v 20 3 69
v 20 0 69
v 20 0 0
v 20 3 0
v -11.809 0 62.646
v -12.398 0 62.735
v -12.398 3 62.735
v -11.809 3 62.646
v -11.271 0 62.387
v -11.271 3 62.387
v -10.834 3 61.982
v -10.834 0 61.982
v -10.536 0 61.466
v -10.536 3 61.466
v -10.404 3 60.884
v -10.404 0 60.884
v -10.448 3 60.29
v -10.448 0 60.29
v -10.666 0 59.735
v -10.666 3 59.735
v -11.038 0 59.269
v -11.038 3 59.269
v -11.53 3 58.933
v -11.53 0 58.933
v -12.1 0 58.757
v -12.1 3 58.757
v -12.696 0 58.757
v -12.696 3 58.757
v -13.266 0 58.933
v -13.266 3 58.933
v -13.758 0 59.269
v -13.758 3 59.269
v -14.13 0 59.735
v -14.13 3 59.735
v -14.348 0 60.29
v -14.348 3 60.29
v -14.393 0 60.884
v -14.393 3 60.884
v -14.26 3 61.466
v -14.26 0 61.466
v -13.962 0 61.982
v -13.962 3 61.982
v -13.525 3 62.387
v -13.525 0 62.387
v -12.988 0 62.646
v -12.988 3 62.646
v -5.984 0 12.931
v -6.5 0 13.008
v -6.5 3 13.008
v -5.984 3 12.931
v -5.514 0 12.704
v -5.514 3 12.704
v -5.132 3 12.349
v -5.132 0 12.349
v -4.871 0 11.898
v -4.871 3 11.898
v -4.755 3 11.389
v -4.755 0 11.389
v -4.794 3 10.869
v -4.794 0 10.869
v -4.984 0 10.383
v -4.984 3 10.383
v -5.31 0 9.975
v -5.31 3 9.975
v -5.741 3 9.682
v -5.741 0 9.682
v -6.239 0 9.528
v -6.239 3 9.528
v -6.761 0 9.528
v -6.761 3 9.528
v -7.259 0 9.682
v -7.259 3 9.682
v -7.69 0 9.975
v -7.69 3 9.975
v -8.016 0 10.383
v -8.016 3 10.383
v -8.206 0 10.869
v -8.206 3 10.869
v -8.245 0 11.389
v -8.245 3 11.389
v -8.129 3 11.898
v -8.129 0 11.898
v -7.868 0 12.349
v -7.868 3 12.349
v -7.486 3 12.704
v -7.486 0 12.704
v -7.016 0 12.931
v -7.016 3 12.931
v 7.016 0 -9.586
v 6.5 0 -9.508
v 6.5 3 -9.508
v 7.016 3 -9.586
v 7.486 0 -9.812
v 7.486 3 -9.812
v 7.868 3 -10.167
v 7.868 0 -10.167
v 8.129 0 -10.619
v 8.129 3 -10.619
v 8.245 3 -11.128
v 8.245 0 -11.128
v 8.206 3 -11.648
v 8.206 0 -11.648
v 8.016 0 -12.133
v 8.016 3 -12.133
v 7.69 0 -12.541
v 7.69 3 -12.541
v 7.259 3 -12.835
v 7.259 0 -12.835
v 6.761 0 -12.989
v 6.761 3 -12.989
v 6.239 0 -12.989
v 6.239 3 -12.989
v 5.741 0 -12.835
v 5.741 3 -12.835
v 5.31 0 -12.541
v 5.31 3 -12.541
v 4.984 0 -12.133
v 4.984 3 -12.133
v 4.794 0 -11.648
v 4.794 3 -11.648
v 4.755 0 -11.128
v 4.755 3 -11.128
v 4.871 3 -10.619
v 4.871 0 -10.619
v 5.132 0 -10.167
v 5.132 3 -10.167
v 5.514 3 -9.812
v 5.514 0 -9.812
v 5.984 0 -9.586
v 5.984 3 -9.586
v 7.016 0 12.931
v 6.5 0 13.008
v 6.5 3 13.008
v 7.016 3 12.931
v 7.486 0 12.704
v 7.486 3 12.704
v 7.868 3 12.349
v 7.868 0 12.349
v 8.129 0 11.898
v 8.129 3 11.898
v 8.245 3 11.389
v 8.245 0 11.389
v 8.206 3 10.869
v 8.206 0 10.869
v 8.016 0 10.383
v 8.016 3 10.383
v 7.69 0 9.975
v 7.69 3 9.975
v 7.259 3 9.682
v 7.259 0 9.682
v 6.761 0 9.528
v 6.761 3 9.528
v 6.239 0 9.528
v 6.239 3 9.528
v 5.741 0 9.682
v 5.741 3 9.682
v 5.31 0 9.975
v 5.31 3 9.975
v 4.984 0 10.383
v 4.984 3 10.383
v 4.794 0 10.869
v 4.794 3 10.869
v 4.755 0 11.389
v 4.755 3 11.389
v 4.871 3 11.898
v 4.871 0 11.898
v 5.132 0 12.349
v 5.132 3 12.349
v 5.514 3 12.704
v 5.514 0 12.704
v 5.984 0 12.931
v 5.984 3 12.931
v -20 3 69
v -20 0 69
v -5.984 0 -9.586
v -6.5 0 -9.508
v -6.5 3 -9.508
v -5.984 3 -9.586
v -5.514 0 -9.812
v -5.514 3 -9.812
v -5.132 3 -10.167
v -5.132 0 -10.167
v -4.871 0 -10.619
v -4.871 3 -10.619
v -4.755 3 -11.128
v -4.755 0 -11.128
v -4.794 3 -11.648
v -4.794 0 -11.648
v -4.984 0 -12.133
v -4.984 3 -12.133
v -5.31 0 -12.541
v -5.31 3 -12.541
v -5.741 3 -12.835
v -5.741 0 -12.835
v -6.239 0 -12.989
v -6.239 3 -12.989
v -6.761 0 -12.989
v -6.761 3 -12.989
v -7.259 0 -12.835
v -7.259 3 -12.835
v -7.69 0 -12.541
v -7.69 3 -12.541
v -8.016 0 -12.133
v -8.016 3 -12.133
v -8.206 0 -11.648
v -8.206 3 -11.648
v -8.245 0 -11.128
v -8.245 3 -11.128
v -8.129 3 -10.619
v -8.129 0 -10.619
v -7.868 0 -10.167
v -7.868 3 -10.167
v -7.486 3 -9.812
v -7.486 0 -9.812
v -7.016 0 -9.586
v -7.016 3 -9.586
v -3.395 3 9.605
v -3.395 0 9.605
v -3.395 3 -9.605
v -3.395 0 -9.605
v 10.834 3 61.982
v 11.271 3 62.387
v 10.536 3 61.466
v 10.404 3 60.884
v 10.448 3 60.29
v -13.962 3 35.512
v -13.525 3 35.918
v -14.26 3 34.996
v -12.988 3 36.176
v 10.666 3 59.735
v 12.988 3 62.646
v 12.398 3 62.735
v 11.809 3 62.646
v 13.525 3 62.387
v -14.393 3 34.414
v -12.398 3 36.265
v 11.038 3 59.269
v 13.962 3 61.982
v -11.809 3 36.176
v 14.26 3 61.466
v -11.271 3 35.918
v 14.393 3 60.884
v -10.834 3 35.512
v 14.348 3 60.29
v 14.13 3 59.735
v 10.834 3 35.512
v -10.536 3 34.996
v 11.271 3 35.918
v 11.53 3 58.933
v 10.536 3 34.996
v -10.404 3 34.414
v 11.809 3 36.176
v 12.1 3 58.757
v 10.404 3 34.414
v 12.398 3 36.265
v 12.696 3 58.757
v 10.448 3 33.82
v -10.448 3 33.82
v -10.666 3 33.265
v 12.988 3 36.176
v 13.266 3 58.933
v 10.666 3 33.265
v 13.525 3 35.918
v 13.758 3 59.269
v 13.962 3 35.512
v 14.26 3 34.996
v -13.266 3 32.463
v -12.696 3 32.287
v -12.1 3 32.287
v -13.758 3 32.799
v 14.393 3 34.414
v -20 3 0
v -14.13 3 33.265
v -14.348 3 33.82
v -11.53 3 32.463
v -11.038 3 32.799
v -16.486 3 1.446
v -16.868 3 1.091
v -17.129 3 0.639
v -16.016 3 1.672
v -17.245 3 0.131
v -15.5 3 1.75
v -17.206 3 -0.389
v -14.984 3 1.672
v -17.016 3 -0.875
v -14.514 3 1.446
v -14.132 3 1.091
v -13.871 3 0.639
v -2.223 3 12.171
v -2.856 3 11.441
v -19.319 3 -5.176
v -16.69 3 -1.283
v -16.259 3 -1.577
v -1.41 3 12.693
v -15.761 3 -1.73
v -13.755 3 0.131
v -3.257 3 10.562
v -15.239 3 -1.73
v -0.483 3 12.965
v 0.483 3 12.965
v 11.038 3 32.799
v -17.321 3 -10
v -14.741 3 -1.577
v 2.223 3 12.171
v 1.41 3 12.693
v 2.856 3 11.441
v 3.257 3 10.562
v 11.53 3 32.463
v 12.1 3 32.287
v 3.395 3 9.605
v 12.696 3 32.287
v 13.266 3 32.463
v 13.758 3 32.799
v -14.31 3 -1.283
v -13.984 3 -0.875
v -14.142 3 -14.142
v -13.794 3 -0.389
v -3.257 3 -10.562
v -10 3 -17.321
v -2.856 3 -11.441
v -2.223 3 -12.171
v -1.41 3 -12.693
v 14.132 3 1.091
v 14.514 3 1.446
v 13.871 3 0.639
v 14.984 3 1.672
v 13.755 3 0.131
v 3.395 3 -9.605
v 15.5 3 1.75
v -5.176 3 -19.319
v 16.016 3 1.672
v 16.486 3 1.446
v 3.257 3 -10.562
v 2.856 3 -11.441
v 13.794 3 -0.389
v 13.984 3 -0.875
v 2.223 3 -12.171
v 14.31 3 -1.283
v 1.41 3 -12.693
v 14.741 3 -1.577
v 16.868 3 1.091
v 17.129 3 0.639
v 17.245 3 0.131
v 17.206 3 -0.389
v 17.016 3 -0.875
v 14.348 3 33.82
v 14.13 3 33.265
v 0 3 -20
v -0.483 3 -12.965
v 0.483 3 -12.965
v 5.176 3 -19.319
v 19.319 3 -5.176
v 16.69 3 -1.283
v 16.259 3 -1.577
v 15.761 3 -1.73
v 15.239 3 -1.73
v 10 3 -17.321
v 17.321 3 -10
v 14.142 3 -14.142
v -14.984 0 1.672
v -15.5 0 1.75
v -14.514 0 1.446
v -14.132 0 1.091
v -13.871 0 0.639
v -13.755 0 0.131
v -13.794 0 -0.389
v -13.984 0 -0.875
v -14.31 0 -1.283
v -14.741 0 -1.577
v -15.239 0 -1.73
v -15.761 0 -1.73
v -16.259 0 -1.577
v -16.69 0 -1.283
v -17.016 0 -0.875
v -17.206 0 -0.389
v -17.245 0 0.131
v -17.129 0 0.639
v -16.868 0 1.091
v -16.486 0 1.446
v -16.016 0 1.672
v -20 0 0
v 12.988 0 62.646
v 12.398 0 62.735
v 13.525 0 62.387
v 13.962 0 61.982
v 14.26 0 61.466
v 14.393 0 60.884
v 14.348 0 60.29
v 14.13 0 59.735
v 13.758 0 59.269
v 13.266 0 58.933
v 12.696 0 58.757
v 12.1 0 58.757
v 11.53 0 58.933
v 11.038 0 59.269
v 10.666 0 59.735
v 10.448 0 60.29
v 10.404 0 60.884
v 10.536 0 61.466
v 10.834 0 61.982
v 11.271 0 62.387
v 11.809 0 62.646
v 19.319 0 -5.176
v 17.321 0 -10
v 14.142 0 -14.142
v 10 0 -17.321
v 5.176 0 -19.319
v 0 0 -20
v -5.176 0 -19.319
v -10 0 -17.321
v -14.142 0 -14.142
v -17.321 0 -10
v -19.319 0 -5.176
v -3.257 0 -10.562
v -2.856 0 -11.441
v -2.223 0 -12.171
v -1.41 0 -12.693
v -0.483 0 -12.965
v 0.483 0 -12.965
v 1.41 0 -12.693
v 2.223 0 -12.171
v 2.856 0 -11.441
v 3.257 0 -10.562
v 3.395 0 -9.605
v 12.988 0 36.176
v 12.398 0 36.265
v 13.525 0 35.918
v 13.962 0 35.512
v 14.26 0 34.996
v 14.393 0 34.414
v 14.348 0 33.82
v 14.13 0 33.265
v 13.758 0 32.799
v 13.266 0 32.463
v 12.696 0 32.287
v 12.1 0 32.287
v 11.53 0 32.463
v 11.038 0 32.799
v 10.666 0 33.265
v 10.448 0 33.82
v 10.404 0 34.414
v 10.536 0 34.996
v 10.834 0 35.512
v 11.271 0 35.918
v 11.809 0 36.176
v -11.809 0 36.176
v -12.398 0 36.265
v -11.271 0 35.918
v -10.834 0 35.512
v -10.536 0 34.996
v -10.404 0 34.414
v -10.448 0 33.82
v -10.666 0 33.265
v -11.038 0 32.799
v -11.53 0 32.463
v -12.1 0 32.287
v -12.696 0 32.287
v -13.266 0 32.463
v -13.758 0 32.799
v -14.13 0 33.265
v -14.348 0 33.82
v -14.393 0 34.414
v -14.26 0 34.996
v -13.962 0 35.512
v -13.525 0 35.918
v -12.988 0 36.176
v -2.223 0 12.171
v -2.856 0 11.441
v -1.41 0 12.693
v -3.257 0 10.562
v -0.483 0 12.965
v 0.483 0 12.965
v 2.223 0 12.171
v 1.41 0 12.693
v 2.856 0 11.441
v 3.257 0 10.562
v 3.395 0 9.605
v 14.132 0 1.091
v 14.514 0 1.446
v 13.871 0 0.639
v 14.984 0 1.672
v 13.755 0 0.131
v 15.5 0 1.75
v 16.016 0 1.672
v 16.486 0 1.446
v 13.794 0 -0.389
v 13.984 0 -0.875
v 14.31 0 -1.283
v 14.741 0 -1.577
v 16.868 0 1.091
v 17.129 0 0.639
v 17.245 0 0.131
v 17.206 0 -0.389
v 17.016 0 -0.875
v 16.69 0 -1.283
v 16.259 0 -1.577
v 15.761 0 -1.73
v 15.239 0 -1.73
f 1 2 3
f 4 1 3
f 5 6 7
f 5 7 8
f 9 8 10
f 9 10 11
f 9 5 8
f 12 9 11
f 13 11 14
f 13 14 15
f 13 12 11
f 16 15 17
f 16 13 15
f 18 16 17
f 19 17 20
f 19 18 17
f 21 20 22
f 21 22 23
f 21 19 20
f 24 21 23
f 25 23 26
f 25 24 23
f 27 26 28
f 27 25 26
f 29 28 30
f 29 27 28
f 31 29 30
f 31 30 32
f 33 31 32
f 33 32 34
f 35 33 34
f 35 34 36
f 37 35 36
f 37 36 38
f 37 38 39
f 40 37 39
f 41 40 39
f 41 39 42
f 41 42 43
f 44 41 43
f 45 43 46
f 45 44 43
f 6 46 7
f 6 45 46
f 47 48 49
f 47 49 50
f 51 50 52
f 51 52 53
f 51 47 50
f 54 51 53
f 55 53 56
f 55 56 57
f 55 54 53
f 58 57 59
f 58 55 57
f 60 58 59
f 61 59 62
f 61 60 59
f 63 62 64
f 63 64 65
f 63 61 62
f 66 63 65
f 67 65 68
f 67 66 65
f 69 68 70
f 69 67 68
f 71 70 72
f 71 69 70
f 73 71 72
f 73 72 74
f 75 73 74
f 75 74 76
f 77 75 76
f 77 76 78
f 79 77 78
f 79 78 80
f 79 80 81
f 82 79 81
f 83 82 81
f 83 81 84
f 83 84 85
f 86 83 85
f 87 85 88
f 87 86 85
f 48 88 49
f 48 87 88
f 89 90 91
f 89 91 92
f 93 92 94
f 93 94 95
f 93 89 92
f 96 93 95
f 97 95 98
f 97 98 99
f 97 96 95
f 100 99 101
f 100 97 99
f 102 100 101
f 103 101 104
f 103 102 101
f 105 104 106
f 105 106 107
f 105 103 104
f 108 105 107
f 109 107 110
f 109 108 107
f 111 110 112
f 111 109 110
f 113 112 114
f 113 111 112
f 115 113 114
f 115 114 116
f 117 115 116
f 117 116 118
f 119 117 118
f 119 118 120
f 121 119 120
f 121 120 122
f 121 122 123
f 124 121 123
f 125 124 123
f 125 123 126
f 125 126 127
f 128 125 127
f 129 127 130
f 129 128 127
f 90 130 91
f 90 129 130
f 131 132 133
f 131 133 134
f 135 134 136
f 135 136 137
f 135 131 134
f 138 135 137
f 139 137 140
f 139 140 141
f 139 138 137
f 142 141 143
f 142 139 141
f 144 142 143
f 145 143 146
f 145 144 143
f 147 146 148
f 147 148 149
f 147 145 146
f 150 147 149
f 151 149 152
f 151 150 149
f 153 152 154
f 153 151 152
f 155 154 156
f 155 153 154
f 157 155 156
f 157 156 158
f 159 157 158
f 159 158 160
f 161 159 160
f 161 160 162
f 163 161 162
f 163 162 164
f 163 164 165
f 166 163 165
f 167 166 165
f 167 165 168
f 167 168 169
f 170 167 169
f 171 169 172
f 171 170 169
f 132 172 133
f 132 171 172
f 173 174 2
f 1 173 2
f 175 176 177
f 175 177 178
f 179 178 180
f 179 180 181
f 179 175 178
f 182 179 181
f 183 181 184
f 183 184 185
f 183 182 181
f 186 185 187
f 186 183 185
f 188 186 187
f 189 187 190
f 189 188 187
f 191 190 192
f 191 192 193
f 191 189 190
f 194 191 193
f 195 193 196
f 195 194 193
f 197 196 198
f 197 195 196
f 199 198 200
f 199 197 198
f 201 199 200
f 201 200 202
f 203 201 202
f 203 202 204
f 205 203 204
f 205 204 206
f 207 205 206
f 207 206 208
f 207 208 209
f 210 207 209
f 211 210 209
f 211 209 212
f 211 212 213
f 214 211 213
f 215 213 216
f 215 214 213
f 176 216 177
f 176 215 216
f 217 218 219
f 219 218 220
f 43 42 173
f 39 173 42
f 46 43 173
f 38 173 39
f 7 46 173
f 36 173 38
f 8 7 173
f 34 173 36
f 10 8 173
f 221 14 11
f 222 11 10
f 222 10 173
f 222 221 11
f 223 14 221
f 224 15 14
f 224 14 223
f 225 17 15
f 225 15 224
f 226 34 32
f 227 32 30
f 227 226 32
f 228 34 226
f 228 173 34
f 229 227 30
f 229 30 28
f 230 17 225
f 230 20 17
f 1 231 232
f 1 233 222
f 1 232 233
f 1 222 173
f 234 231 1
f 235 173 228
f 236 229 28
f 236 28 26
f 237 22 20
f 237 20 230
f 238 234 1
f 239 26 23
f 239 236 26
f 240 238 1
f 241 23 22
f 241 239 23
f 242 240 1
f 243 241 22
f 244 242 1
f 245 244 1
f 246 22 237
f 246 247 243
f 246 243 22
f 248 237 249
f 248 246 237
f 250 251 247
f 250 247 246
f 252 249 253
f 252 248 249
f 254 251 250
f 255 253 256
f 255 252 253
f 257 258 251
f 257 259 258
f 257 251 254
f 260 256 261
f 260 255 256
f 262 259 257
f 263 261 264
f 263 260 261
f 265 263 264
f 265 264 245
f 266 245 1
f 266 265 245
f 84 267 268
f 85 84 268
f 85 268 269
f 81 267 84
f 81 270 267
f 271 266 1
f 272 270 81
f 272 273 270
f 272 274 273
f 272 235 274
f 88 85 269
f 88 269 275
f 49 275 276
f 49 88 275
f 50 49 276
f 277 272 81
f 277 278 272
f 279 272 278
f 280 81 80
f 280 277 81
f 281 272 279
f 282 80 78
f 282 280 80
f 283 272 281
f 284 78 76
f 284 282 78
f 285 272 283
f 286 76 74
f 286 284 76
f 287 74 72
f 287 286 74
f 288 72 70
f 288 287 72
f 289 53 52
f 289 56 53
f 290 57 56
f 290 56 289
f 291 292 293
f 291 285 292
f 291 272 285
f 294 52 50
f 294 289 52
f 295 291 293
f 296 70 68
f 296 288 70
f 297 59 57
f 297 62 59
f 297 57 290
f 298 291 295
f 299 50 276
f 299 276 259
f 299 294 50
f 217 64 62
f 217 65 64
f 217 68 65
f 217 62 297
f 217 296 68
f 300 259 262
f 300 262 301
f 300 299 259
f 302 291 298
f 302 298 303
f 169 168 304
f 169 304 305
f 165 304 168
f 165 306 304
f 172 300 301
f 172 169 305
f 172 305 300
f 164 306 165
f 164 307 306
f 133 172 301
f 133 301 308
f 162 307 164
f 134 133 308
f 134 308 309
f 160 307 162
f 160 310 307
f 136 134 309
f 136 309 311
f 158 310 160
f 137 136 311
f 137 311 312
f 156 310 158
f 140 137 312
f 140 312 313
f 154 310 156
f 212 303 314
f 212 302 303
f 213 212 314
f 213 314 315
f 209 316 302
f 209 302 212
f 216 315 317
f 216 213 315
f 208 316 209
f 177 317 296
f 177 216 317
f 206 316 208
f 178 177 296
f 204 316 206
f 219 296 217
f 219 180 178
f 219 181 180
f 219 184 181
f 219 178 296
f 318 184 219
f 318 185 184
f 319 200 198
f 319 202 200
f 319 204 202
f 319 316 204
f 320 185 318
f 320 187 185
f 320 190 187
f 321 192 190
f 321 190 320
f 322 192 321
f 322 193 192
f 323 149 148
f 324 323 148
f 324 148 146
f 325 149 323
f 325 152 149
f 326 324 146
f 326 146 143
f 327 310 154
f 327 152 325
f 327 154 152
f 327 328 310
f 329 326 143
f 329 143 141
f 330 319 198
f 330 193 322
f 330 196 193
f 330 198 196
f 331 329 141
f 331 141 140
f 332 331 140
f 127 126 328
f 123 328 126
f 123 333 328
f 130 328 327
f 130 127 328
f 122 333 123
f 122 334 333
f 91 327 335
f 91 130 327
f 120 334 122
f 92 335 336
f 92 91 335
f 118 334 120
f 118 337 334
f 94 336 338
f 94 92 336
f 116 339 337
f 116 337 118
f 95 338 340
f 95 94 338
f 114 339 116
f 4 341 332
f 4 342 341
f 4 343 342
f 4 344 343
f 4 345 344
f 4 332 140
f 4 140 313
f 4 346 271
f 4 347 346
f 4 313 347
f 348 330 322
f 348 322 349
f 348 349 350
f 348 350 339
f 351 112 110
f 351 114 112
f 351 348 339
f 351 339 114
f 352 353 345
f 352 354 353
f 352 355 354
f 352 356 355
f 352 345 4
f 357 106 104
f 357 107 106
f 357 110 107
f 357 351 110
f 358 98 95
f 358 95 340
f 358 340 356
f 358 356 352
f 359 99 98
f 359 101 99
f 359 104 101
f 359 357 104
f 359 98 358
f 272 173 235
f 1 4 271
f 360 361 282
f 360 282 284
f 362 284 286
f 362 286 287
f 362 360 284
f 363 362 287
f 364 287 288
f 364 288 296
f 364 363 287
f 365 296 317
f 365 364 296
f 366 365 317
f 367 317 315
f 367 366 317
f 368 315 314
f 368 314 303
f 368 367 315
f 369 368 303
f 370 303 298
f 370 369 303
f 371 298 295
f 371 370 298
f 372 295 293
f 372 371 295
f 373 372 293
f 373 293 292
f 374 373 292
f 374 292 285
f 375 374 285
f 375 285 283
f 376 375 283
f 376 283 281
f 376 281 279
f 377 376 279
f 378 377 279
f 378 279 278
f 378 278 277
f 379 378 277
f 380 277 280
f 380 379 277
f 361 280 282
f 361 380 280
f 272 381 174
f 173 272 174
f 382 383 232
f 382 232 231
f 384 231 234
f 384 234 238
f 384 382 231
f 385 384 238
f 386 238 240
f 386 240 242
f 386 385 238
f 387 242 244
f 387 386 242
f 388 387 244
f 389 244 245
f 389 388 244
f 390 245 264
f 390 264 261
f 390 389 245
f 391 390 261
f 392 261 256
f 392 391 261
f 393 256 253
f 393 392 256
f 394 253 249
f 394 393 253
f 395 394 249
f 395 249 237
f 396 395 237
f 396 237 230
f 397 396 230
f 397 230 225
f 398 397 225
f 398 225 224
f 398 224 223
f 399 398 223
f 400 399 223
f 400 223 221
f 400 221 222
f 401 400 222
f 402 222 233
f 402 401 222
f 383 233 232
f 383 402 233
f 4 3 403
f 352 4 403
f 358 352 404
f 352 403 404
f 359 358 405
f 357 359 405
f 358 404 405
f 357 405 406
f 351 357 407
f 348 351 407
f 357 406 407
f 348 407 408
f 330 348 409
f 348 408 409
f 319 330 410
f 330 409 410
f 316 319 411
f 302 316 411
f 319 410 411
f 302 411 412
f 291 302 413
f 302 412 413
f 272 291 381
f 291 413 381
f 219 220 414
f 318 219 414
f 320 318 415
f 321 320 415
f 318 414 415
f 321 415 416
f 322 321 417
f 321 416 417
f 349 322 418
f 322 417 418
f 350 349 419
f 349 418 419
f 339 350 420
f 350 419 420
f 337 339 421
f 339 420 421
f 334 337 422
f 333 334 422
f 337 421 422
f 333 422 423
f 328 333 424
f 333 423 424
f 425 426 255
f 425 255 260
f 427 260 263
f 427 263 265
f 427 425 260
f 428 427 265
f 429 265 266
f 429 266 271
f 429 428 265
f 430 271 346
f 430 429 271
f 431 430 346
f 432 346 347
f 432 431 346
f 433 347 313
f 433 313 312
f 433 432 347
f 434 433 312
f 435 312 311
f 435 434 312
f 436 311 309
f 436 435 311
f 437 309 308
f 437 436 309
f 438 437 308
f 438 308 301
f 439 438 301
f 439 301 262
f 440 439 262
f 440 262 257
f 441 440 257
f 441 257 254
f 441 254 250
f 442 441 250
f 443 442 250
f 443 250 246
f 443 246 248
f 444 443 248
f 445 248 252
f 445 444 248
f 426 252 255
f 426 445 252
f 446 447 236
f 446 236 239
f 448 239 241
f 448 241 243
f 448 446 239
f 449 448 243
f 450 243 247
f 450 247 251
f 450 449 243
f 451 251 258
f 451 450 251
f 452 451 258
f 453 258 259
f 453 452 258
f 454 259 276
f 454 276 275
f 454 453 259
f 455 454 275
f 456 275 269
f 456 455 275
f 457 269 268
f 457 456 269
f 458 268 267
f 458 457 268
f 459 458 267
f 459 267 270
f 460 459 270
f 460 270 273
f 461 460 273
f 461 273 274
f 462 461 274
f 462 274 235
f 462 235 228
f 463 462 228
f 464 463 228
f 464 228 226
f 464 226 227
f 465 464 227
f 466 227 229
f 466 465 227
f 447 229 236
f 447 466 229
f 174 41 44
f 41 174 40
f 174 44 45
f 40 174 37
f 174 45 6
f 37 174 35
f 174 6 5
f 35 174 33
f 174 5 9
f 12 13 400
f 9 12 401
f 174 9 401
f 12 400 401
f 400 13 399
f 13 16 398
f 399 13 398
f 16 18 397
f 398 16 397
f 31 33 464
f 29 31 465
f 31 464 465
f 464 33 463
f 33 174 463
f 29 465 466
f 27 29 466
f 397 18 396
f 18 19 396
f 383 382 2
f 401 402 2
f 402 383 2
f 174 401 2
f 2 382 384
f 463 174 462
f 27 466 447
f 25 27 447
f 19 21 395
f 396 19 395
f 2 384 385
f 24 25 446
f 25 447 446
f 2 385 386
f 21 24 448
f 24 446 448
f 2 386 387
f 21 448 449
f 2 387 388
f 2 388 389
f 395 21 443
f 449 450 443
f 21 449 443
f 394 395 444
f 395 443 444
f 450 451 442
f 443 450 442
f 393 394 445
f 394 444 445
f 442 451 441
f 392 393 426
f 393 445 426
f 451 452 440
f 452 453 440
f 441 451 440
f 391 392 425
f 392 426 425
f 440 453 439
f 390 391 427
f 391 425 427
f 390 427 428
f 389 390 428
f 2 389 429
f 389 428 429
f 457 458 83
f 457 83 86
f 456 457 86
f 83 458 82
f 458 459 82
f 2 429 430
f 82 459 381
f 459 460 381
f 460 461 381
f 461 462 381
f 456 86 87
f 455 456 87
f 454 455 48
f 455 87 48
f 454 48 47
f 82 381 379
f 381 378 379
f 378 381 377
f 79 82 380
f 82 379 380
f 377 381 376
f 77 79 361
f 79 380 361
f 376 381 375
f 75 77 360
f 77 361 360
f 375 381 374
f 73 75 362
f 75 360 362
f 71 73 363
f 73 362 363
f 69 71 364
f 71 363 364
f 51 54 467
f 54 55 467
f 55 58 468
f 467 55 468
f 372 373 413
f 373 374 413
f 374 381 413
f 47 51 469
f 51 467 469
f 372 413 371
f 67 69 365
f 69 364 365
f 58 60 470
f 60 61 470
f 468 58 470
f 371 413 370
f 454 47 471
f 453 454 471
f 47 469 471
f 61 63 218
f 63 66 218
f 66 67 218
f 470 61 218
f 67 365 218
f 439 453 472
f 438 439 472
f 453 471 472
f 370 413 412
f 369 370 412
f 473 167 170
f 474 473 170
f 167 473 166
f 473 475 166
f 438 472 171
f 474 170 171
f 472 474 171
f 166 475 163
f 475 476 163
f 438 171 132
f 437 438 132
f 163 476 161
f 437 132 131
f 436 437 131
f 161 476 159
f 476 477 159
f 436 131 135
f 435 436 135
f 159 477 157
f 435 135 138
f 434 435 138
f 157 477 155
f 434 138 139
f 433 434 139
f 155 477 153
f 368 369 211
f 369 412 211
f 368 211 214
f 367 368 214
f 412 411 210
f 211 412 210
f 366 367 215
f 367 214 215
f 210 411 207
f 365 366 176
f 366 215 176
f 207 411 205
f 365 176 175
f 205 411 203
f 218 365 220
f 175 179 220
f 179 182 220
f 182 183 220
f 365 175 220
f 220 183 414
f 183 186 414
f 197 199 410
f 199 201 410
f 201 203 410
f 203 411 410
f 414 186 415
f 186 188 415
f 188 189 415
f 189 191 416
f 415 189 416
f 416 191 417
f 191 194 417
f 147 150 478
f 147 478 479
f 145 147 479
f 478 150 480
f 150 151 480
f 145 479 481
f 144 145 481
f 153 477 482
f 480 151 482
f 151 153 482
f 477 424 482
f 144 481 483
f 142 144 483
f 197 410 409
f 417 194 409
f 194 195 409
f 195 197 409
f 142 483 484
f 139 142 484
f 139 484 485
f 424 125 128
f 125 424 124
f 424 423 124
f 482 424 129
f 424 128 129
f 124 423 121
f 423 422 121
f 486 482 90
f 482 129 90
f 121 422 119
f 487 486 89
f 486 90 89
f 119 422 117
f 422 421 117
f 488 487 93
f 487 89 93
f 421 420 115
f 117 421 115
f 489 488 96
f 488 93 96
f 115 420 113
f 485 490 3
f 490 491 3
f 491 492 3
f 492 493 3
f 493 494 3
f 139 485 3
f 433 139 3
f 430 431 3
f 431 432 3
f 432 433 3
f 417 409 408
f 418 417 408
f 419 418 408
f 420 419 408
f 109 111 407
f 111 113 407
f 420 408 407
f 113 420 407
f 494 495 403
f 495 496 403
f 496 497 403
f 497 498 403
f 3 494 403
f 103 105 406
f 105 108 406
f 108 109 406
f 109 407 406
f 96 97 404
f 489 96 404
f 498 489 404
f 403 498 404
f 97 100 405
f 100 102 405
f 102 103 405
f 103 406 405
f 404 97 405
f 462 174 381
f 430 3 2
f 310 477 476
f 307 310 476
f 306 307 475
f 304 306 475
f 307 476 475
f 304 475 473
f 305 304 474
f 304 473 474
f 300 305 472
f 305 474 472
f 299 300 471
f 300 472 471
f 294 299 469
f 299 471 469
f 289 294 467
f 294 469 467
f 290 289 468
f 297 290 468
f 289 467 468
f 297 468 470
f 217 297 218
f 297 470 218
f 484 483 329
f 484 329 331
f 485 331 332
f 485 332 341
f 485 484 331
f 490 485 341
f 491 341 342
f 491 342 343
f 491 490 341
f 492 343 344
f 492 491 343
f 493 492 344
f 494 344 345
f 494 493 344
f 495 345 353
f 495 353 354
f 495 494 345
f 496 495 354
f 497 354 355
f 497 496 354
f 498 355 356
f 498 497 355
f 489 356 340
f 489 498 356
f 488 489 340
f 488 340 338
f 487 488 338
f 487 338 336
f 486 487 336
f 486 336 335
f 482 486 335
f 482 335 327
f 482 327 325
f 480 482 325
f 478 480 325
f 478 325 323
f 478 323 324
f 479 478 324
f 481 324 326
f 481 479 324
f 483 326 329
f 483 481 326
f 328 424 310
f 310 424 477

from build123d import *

# Parameters (mm, degrees)
SKETCH_1_R      = 1.75
SKETCH_1_R_2    = 2
EXTRUDE_1_DEPTH = 3


with BuildPart() as part:
    # 草图1 → 凸台-拉伸1 (new body)
    with BuildSketch(Plane(origin=(0, 0, 0), x_dir=(1, 0, 0), z_dir=(0, 1, 0))):
        with BuildLine():
            Line((-20, 0), (-20, -69))
            Line((-20, -69), (20, -69))
            Line((20, -69), (20, 0))
            ThreePointArc((20, 0), (0, 20), (-20, 0))
        make_face()
        with Locations(Location((-6.5, 11.258330249, 0), (0, 0, 270))):
            Circle(SKETCH_1_R, mode=Mode.SUBTRACT)
        with Locations(Location((6.5, 11.258330249, 0), (0, 0, 270))):
            Circle(SKETCH_1_R, mode=Mode.SUBTRACT)
        with Locations(Location((-15.5, 0, 0), (0, 0, 270))):
            Circle(SKETCH_1_R, mode=Mode.SUBTRACT)
        with Locations(Location((15.5, 0, 0), (0, 0, 270))):
            Circle(SKETCH_1_R, mode=Mode.SUBTRACT)
        with Locations(Location((-6.5, -11.258330249, 0), (0, 0, 270))):
            Circle(SKETCH_1_R, mode=Mode.SUBTRACT)
        with Locations(Location((6.5, -11.258330249, 0), (0, 0, 270))):
            Circle(SKETCH_1_R, mode=Mode.SUBTRACT)
        with Locations(Location((-12.398128108, -34.265032361, 0), (0, 0, 270))):
            Circle(SKETCH_1_R_2, mode=Mode.SUBTRACT)
        with Locations(Location((-12.398128108, -60.734967639, 0), (0, 0, 270))):
            Circle(SKETCH_1_R_2, mode=Mode.SUBTRACT)
        with Locations(Location((12.398128108, -34.265032361, 0), (0, 0, 270))):
            Circle(SKETCH_1_R_2, mode=Mode.SUBTRACT)
        with Locations(Location((12.398128108, -60.734967639, 0), (0, 0, 270))):
            Circle(SKETCH_1_R_2, mode=Mode.SUBTRACT)
        with BuildLine():
            Line((3.394790848, 9.605209152), (3.394790848, -9.605209152))
            ThreePointArc((3.394790848, -9.605209152), (0, -13), (-3.394790848, -9.605209152))
            Line((-3.394790848, -9.605209152), (-3.394790848, 9.605209152))
            ThreePointArc((-3.394790848, 9.605209152), (0, 13), (3.394790848, 9.605209152))
        make_face(mode=Mode.SUBTRACT)
    extrude(amount=EXTRUDE_1_DEPTH)


solid = part.part
